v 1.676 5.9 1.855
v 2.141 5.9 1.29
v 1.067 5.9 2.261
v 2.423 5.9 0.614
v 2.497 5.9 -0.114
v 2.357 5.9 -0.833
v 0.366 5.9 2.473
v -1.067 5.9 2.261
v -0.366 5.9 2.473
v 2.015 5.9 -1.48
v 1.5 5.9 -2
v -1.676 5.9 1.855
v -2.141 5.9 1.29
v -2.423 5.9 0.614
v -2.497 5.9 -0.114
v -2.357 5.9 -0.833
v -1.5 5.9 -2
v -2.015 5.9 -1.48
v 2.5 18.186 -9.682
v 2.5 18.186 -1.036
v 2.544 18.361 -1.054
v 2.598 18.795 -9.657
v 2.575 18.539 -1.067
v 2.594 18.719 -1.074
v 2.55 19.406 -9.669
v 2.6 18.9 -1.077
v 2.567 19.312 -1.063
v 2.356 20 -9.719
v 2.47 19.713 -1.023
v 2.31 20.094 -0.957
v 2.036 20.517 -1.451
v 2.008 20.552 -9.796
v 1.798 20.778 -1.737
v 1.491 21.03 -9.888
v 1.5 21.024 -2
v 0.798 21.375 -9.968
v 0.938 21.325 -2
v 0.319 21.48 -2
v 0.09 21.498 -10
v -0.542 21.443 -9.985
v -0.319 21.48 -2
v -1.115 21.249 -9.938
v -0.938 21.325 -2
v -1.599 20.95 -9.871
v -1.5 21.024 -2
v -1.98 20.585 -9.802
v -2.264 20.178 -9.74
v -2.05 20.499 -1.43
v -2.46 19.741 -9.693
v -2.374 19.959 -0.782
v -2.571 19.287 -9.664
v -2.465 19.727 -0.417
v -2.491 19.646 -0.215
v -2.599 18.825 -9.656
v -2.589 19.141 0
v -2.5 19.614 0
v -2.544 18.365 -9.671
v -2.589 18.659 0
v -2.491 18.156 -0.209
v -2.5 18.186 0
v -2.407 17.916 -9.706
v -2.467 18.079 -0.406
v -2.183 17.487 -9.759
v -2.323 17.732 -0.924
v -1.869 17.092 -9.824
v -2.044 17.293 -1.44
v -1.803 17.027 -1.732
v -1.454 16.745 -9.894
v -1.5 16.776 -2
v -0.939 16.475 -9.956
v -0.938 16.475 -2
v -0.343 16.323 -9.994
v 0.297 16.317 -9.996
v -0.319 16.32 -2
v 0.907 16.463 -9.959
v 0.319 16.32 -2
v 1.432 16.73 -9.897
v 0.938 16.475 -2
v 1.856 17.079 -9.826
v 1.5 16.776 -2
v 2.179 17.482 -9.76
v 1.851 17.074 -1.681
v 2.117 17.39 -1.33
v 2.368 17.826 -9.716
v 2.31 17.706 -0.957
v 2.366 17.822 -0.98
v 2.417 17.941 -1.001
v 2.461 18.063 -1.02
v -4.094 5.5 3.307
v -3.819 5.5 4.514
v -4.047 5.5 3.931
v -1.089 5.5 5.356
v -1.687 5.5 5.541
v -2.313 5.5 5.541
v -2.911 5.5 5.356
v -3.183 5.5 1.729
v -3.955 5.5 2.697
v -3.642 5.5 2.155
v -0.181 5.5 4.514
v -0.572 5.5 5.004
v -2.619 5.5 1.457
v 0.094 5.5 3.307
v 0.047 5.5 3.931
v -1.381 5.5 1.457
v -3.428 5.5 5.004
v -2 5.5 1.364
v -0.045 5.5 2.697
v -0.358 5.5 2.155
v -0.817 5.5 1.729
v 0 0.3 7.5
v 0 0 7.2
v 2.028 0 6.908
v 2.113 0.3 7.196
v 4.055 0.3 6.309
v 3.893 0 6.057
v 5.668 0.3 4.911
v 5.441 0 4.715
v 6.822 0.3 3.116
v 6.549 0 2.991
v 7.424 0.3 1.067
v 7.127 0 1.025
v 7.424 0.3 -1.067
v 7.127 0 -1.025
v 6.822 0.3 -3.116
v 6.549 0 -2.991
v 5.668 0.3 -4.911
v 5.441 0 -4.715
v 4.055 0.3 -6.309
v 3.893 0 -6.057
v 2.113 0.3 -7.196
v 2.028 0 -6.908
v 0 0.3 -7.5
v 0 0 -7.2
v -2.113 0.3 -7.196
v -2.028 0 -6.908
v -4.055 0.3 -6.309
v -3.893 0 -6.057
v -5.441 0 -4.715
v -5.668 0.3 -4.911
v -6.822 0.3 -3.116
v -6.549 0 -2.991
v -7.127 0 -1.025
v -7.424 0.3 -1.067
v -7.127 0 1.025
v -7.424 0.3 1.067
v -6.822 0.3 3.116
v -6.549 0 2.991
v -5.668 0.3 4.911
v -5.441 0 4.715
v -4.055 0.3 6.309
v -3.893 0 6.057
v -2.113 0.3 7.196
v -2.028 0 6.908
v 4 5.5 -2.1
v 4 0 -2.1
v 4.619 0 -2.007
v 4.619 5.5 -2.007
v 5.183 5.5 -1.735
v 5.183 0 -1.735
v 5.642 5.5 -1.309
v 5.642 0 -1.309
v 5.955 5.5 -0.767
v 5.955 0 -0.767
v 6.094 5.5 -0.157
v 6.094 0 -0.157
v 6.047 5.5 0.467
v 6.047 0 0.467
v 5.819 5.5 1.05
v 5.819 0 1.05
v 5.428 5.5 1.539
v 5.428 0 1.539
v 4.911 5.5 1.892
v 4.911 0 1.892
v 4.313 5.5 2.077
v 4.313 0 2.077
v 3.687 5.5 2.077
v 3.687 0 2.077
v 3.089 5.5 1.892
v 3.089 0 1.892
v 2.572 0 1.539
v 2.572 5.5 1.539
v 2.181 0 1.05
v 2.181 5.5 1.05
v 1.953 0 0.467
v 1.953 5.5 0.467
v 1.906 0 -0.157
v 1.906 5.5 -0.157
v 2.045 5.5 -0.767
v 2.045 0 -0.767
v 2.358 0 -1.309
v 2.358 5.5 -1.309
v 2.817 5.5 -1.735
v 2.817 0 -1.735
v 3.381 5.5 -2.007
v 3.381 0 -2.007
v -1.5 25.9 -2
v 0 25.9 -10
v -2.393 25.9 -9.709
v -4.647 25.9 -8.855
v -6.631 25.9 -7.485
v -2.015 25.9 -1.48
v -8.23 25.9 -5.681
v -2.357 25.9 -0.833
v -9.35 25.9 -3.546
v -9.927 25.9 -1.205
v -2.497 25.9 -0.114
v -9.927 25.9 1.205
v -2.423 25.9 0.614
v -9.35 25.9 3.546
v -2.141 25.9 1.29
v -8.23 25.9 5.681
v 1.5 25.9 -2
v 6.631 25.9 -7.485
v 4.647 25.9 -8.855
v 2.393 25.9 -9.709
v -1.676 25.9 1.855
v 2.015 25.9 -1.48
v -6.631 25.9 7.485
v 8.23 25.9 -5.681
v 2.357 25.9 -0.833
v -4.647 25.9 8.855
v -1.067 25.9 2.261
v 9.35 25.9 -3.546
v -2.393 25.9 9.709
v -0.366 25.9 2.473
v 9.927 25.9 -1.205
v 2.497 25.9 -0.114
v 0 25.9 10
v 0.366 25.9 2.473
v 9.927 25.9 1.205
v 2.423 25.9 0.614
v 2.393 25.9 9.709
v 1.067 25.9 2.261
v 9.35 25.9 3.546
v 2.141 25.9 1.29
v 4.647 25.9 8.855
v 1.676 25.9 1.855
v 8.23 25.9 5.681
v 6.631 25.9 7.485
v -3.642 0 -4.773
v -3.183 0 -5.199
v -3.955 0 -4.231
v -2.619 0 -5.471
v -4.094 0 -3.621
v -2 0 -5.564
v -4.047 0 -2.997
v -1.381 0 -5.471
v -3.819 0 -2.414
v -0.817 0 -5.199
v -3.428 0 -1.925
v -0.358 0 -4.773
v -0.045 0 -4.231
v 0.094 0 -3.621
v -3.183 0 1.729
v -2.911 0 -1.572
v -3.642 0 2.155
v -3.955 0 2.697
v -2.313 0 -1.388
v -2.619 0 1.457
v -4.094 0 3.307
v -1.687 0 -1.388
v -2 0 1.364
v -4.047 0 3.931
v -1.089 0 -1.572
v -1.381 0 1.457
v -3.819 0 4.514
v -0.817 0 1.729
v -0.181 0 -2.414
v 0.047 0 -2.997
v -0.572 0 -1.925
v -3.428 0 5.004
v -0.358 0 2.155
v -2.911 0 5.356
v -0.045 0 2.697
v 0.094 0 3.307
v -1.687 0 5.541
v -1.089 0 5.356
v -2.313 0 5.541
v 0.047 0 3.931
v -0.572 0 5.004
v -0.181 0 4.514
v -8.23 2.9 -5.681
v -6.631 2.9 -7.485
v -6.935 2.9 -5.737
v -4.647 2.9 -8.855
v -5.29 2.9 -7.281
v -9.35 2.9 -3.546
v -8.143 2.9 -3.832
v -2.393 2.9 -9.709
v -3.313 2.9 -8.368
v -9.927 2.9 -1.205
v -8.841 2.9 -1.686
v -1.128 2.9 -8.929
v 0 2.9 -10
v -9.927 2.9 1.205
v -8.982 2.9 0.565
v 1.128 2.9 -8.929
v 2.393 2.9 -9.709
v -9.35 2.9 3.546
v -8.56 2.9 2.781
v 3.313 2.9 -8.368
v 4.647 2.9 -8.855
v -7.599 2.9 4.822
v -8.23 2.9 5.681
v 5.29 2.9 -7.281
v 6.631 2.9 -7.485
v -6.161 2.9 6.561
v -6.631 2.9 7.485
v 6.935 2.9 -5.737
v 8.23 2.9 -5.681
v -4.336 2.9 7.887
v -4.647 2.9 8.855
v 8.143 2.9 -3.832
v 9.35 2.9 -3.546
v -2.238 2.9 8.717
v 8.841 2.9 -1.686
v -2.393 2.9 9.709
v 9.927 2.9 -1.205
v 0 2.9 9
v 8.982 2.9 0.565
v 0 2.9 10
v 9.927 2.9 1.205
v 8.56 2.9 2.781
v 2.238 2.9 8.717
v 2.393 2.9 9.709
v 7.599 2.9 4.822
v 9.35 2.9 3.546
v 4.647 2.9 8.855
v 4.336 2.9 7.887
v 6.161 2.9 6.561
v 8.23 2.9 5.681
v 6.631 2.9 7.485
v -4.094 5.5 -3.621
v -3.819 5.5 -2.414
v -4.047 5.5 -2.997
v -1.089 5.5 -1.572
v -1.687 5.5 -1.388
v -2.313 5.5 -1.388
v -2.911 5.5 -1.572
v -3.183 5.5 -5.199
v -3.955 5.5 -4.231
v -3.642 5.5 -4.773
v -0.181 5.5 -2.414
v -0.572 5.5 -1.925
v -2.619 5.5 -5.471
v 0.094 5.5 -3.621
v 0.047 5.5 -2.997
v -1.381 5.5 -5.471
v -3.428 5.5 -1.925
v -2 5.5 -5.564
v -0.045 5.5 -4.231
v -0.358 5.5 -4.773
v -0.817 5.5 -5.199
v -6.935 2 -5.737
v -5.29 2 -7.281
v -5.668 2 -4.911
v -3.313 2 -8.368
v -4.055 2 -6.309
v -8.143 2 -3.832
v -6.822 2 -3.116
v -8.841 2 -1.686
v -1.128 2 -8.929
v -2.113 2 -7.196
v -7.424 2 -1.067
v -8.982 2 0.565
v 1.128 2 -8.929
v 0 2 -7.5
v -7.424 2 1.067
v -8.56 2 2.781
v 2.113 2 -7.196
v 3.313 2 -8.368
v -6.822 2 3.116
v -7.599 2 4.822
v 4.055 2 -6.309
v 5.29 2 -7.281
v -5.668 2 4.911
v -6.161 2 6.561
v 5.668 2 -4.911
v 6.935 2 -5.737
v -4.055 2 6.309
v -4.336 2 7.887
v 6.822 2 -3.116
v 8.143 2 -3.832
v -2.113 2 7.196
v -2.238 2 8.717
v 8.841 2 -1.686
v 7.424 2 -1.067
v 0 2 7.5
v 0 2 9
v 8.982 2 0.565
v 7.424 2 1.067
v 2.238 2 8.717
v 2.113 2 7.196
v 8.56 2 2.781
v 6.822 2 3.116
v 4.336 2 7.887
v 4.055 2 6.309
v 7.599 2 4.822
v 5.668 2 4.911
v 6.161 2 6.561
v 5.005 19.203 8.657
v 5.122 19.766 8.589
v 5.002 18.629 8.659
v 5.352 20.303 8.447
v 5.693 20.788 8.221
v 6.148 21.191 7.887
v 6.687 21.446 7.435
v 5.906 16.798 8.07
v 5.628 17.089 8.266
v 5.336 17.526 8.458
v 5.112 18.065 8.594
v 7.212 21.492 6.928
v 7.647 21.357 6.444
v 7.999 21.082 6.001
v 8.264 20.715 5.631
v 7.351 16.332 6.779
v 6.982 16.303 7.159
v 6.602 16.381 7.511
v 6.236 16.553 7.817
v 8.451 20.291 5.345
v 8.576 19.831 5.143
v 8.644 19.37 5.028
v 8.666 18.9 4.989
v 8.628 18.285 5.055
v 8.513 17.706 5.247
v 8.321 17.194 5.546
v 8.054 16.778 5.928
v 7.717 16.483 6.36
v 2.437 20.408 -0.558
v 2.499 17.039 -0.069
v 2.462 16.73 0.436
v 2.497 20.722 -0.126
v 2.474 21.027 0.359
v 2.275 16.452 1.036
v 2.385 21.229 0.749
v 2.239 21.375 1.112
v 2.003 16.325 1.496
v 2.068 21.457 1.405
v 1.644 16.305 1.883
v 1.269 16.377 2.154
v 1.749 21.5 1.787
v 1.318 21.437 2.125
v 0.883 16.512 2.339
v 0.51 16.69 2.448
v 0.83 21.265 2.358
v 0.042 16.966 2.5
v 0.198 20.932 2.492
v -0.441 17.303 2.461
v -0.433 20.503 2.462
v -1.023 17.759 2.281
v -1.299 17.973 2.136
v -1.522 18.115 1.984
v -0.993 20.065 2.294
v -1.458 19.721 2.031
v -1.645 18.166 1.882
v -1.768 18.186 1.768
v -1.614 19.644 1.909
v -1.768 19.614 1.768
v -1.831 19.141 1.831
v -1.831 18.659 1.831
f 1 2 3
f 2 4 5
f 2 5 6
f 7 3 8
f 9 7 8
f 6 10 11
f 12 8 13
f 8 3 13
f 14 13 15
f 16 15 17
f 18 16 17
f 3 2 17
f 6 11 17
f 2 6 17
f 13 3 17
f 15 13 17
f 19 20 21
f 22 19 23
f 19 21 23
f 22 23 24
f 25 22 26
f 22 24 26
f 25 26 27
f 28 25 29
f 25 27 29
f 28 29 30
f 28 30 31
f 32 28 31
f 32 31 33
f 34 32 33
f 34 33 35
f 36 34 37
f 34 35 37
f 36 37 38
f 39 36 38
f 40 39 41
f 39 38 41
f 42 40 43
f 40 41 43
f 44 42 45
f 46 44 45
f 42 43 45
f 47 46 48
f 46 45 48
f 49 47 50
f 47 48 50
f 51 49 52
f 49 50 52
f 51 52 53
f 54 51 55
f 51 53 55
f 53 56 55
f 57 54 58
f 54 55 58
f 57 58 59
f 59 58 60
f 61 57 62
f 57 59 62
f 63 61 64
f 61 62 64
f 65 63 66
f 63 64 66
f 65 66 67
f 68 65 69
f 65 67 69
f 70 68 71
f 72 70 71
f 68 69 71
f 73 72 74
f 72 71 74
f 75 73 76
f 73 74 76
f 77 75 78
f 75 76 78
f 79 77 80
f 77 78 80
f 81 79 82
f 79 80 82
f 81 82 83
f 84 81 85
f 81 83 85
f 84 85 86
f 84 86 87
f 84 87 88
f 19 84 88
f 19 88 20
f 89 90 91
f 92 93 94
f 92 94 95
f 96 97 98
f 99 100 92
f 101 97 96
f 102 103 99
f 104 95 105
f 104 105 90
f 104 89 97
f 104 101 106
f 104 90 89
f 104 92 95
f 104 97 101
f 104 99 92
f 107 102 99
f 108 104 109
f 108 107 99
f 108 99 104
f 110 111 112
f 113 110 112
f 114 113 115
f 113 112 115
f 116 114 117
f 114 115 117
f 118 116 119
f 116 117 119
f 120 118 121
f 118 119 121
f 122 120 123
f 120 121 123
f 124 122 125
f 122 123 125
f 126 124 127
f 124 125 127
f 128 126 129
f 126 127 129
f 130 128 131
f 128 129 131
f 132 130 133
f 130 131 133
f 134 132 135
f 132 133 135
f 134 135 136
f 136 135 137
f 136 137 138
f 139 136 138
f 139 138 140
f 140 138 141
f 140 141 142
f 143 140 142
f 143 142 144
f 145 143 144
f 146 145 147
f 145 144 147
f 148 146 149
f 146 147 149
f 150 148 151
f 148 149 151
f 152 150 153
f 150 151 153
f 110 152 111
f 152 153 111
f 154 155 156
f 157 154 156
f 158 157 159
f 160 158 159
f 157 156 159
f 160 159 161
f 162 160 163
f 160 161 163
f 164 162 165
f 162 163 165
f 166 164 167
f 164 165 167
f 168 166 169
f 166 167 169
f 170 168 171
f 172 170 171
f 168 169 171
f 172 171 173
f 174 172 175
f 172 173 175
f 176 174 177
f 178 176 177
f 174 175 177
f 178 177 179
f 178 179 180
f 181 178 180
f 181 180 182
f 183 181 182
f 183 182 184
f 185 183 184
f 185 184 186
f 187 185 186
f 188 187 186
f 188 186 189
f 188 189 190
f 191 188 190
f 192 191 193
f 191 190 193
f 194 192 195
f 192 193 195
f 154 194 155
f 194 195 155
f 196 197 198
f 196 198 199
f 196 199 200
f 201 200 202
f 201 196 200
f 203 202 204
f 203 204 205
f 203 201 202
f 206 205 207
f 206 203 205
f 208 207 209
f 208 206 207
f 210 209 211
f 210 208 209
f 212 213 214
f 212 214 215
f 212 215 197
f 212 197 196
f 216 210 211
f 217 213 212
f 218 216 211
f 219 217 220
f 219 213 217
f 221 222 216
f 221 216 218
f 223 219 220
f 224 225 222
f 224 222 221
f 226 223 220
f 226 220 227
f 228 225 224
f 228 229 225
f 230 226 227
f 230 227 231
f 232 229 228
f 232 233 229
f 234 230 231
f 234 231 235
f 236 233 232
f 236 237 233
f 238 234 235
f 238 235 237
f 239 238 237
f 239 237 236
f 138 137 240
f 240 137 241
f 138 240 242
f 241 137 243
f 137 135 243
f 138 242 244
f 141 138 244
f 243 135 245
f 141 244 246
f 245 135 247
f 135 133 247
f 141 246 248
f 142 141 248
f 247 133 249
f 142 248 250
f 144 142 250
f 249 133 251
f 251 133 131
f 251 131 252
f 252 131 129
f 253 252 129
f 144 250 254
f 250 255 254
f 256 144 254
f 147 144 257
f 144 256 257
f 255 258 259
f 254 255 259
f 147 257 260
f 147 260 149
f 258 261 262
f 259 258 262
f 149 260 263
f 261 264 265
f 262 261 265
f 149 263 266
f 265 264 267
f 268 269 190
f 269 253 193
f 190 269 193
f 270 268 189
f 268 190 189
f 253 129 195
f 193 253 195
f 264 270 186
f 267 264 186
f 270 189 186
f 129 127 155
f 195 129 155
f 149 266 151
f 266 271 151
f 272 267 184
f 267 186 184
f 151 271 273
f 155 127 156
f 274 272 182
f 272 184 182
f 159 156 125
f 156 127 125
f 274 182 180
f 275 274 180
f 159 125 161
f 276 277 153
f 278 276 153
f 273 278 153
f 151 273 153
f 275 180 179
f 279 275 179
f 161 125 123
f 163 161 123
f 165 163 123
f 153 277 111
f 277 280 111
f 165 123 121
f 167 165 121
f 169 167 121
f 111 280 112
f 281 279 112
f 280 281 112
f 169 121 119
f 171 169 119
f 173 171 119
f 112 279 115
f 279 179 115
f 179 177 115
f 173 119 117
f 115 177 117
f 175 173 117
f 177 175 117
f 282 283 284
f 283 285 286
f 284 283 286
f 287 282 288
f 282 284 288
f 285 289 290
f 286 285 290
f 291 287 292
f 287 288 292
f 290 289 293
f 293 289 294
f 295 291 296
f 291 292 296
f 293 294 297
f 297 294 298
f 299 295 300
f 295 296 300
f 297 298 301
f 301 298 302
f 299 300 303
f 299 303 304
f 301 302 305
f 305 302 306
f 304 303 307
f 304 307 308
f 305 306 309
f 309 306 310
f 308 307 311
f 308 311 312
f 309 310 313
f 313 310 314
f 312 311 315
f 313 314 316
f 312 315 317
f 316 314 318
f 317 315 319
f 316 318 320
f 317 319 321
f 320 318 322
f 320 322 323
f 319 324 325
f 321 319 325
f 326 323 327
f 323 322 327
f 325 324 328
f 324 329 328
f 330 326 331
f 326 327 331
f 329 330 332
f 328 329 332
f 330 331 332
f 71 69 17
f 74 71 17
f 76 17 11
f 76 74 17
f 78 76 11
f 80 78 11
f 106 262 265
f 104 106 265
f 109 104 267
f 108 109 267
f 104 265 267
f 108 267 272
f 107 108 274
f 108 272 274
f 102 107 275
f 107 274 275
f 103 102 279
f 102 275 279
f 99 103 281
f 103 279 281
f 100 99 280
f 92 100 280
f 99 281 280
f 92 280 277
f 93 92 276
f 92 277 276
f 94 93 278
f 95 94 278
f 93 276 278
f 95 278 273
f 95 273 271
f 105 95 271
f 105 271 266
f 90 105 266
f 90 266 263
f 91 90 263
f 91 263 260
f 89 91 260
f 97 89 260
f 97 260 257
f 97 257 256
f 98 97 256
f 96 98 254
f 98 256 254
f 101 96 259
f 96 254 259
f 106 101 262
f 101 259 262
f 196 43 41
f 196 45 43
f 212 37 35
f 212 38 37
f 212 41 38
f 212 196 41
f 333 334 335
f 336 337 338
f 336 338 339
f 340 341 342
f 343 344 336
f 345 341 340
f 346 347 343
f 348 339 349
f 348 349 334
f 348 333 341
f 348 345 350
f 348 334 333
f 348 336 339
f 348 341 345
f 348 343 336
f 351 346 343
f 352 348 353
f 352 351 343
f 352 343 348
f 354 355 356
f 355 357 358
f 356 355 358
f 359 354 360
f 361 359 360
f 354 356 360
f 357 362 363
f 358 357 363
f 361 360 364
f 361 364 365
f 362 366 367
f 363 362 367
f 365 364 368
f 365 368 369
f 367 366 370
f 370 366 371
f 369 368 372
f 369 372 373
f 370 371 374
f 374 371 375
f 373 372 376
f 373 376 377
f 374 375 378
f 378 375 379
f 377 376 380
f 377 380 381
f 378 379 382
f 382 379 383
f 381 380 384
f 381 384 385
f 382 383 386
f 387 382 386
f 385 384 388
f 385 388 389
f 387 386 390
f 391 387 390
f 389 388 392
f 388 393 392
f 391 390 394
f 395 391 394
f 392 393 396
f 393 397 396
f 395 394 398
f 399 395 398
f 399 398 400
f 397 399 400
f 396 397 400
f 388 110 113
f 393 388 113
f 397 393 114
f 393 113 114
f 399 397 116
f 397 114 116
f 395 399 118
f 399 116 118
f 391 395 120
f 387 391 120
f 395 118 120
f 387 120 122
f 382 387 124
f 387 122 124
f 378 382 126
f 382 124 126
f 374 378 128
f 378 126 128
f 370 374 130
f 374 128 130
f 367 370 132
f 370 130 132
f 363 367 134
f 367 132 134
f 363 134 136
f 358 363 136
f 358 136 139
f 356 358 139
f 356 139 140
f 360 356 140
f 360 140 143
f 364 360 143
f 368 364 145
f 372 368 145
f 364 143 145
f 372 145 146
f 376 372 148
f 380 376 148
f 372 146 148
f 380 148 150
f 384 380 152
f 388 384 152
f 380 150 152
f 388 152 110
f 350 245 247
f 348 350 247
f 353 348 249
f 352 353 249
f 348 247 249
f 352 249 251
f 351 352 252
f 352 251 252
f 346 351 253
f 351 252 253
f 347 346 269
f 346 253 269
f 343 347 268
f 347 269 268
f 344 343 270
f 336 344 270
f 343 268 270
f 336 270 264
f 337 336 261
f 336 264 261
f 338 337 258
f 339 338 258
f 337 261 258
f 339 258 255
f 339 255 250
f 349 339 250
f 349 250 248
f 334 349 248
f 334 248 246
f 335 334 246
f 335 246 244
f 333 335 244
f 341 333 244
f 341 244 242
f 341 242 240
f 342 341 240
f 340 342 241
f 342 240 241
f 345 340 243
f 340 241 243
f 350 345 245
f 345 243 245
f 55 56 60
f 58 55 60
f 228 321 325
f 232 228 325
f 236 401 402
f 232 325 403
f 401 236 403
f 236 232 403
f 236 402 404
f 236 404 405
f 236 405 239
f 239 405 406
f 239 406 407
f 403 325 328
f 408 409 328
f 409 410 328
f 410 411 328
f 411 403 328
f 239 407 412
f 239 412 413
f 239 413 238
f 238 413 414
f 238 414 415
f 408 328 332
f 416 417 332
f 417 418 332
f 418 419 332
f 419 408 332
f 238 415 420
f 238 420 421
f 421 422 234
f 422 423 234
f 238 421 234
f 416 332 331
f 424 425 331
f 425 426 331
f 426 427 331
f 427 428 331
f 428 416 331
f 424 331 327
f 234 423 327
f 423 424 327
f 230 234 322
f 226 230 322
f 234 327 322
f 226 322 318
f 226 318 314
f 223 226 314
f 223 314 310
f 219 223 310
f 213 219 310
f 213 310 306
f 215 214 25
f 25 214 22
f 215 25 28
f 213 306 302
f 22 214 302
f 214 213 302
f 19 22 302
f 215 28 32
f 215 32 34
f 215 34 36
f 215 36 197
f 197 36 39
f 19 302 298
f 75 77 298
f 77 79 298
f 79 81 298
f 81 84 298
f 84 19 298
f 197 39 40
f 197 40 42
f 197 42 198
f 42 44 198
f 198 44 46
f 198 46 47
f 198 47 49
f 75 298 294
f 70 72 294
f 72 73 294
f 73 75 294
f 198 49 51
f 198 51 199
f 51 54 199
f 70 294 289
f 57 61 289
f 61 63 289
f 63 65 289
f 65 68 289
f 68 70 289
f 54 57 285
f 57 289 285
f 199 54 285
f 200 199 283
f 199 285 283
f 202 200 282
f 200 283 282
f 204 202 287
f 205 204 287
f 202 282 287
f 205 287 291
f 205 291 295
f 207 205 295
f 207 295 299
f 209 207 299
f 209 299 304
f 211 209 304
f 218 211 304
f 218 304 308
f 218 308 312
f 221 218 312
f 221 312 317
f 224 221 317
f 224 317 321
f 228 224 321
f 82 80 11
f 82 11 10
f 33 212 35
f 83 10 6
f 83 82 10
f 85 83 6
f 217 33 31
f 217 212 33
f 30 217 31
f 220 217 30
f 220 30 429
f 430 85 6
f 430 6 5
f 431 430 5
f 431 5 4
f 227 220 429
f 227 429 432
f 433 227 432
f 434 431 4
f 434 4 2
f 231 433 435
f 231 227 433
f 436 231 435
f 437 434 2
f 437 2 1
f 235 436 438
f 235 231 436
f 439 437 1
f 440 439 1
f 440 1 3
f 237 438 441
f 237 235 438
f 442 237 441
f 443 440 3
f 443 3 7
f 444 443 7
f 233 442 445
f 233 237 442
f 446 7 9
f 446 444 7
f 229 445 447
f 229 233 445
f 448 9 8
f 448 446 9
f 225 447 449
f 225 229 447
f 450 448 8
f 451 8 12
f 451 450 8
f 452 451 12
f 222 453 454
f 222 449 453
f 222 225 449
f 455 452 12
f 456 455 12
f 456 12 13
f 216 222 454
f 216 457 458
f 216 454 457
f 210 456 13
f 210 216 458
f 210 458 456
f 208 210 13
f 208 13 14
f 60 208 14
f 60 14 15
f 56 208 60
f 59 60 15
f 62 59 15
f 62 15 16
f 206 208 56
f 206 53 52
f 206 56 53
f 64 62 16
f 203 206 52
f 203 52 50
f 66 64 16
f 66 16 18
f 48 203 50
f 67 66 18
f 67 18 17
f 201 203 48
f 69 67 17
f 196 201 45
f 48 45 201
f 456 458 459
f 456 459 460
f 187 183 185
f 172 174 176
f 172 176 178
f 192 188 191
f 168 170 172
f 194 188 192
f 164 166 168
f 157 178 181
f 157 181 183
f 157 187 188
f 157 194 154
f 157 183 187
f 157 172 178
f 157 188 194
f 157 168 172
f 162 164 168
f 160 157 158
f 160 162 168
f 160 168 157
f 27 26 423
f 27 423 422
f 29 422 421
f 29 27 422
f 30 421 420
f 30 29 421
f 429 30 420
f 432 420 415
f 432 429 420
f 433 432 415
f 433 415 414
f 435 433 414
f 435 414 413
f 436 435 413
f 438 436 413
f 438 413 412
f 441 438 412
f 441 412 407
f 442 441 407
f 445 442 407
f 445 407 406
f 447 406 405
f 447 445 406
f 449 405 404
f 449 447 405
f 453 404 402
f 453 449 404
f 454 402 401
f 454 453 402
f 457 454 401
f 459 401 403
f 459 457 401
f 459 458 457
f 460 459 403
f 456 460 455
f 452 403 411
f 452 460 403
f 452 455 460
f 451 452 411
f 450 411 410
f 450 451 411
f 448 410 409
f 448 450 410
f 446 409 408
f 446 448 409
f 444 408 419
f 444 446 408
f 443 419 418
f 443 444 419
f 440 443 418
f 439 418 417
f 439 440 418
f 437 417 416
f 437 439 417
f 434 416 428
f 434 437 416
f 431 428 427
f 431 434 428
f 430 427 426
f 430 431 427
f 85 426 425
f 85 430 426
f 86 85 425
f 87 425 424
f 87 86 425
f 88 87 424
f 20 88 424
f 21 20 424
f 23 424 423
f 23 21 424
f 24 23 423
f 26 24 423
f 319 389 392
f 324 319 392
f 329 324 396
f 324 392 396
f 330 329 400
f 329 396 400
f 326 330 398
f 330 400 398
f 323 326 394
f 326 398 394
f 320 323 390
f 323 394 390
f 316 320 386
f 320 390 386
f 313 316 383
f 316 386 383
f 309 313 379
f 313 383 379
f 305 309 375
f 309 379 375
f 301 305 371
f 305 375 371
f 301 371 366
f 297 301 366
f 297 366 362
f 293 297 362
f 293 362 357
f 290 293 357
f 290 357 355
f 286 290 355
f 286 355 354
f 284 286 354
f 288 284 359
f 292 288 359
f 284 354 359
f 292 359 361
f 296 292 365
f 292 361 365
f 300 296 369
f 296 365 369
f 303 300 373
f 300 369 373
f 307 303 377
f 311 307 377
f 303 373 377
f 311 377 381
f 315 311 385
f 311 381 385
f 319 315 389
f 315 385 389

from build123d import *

# Parameters (mm, degrees)
SKETCH1_R             = 7.5
BOSS_EXTRUDE1_DEPTH   = 2
SKETCH2_R             = 9
BOSS_EXTRUDE2_DEPTH   = 0.9
SKETCH3_R             = 10
BOSS_EXTRUDE3_DEPTH   = 23
SKETCH5_R             = 2.1
CUT_EXTRUDE1_DEPTH    = 5.5
CUT_EXTRUDE2_DEPTH    = 20
SKETCH7_R             = 2.6
CUT_EXTRUDE3_DEPTH    = 30.509489999
CIRPATTERN1_OUTLINE_R = 2.6
CIRPATTERN1_DEPTH     = 10.0000001
CHAMFER1_SIZE         = 0.3


# Read off the part's stored shape, not the designer's step: CirPattern1
with BuildPart() as part:
    # Sketch1 → Boss-Extrude1 (new body)
    with BuildSketch(Plane(origin=(0, 0, 0), x_dir=(1, 0, 0), z_dir=(0, 1, 0))):
        with Locations(Location((0, 0, 0), (0, 0, 270))):
            Circle(SKETCH1_R)
    extrude(amount=BOSS_EXTRUDE1_DEPTH)

    # Sketch2 → Boss-Extrude2 (add)
    with BuildSketch(Plane(origin=(0, 2, 0), x_dir=(1, 0, 0), z_dir=(0, 1, 0))):
        with Locations(Location((0, 0, 0), (0, 0, 270))):
            Circle(SKETCH2_R)
    extrude(amount=BOSS_EXTRUDE2_DEPTH)

    # Sketch3 → Boss-Extrude3 (add)
    with BuildSketch(Plane(origin=(0, 2.9, 0), x_dir=(1, 0, 0), z_dir=(0, 1, 0))):
        with Locations(Location((0, 0, 0), (0, 0, 270))):
            Circle(SKETCH3_R)
    extrude(amount=BOSS_EXTRUDE3_DEPTH)

    # Sketch5 → Cut-Extrude1 (cut)
    with BuildSketch(Plane.XZ):
        with Locations(Location((4, 0, 0), (0, 0, 270))):
            Circle(SKETCH5_R)
        with Locations(Location((-2, -3.464101615, 0), (0, 0, 270))):
            Circle(SKETCH5_R)
        with Locations(Location((-2, 3.464101615, 0), (0, 0, 270))):
            Circle(SKETCH5_R)
    extrude(amount=-CUT_EXTRUDE1_DEPTH, mode=Mode.SUBTRACT)

    # Sketch6 → Cut-Extrude2 (cut)
    with BuildSketch(Plane(origin=(0, 25.9, 0), x_dir=(1, 0, 0), z_dir=(0, 1, 0))):
        with BuildLine():
            Line((-1.5, 2), (1.5, 2))
            ThreePointArc((1.5, 2), (0, -2.5), (-1.5, 2))
        make_face()
    extrude(amount=-CUT_EXTRUDE2_DEPTH, mode=Mode.SUBTRACT)

    # Sketch7 → Cut-Extrude3 (cut, through all)
    with BuildSketch(Plane.XY):
        with Locations(Location((0, 18.9, 0), (0, 0, 344.057631394))):
            Circle(SKETCH7_R)
    extrude(amount=-CUT_EXTRUDE3_DEPTH, mode=Mode.SUBTRACT)

    # CirPattern1 outline → CirPattern1 (cut)
    with BuildSketch(Plane(origin=(0, 0, 0), x_dir=(0.7071067811865509, 0, -0.707106781186544), z_dir=(0.707106781186544, 0, 0.707106781186551))):
        with Locations((0, 18.9)):
            Circle(CIRPATTERN1_OUTLINE_R)
    extrude(amount=CIRPATTERN1_DEPTH, mode=Mode.SUBTRACT)

    # Chamfer1
    chamfer1_edges = [part.edges().sort_by_distance(p)[0] for p in [
        (0, 0, -7.5),
    ]]
    chamfer(chamfer1_edges, length=CHAMFER1_SIZE)


solid = part.part
